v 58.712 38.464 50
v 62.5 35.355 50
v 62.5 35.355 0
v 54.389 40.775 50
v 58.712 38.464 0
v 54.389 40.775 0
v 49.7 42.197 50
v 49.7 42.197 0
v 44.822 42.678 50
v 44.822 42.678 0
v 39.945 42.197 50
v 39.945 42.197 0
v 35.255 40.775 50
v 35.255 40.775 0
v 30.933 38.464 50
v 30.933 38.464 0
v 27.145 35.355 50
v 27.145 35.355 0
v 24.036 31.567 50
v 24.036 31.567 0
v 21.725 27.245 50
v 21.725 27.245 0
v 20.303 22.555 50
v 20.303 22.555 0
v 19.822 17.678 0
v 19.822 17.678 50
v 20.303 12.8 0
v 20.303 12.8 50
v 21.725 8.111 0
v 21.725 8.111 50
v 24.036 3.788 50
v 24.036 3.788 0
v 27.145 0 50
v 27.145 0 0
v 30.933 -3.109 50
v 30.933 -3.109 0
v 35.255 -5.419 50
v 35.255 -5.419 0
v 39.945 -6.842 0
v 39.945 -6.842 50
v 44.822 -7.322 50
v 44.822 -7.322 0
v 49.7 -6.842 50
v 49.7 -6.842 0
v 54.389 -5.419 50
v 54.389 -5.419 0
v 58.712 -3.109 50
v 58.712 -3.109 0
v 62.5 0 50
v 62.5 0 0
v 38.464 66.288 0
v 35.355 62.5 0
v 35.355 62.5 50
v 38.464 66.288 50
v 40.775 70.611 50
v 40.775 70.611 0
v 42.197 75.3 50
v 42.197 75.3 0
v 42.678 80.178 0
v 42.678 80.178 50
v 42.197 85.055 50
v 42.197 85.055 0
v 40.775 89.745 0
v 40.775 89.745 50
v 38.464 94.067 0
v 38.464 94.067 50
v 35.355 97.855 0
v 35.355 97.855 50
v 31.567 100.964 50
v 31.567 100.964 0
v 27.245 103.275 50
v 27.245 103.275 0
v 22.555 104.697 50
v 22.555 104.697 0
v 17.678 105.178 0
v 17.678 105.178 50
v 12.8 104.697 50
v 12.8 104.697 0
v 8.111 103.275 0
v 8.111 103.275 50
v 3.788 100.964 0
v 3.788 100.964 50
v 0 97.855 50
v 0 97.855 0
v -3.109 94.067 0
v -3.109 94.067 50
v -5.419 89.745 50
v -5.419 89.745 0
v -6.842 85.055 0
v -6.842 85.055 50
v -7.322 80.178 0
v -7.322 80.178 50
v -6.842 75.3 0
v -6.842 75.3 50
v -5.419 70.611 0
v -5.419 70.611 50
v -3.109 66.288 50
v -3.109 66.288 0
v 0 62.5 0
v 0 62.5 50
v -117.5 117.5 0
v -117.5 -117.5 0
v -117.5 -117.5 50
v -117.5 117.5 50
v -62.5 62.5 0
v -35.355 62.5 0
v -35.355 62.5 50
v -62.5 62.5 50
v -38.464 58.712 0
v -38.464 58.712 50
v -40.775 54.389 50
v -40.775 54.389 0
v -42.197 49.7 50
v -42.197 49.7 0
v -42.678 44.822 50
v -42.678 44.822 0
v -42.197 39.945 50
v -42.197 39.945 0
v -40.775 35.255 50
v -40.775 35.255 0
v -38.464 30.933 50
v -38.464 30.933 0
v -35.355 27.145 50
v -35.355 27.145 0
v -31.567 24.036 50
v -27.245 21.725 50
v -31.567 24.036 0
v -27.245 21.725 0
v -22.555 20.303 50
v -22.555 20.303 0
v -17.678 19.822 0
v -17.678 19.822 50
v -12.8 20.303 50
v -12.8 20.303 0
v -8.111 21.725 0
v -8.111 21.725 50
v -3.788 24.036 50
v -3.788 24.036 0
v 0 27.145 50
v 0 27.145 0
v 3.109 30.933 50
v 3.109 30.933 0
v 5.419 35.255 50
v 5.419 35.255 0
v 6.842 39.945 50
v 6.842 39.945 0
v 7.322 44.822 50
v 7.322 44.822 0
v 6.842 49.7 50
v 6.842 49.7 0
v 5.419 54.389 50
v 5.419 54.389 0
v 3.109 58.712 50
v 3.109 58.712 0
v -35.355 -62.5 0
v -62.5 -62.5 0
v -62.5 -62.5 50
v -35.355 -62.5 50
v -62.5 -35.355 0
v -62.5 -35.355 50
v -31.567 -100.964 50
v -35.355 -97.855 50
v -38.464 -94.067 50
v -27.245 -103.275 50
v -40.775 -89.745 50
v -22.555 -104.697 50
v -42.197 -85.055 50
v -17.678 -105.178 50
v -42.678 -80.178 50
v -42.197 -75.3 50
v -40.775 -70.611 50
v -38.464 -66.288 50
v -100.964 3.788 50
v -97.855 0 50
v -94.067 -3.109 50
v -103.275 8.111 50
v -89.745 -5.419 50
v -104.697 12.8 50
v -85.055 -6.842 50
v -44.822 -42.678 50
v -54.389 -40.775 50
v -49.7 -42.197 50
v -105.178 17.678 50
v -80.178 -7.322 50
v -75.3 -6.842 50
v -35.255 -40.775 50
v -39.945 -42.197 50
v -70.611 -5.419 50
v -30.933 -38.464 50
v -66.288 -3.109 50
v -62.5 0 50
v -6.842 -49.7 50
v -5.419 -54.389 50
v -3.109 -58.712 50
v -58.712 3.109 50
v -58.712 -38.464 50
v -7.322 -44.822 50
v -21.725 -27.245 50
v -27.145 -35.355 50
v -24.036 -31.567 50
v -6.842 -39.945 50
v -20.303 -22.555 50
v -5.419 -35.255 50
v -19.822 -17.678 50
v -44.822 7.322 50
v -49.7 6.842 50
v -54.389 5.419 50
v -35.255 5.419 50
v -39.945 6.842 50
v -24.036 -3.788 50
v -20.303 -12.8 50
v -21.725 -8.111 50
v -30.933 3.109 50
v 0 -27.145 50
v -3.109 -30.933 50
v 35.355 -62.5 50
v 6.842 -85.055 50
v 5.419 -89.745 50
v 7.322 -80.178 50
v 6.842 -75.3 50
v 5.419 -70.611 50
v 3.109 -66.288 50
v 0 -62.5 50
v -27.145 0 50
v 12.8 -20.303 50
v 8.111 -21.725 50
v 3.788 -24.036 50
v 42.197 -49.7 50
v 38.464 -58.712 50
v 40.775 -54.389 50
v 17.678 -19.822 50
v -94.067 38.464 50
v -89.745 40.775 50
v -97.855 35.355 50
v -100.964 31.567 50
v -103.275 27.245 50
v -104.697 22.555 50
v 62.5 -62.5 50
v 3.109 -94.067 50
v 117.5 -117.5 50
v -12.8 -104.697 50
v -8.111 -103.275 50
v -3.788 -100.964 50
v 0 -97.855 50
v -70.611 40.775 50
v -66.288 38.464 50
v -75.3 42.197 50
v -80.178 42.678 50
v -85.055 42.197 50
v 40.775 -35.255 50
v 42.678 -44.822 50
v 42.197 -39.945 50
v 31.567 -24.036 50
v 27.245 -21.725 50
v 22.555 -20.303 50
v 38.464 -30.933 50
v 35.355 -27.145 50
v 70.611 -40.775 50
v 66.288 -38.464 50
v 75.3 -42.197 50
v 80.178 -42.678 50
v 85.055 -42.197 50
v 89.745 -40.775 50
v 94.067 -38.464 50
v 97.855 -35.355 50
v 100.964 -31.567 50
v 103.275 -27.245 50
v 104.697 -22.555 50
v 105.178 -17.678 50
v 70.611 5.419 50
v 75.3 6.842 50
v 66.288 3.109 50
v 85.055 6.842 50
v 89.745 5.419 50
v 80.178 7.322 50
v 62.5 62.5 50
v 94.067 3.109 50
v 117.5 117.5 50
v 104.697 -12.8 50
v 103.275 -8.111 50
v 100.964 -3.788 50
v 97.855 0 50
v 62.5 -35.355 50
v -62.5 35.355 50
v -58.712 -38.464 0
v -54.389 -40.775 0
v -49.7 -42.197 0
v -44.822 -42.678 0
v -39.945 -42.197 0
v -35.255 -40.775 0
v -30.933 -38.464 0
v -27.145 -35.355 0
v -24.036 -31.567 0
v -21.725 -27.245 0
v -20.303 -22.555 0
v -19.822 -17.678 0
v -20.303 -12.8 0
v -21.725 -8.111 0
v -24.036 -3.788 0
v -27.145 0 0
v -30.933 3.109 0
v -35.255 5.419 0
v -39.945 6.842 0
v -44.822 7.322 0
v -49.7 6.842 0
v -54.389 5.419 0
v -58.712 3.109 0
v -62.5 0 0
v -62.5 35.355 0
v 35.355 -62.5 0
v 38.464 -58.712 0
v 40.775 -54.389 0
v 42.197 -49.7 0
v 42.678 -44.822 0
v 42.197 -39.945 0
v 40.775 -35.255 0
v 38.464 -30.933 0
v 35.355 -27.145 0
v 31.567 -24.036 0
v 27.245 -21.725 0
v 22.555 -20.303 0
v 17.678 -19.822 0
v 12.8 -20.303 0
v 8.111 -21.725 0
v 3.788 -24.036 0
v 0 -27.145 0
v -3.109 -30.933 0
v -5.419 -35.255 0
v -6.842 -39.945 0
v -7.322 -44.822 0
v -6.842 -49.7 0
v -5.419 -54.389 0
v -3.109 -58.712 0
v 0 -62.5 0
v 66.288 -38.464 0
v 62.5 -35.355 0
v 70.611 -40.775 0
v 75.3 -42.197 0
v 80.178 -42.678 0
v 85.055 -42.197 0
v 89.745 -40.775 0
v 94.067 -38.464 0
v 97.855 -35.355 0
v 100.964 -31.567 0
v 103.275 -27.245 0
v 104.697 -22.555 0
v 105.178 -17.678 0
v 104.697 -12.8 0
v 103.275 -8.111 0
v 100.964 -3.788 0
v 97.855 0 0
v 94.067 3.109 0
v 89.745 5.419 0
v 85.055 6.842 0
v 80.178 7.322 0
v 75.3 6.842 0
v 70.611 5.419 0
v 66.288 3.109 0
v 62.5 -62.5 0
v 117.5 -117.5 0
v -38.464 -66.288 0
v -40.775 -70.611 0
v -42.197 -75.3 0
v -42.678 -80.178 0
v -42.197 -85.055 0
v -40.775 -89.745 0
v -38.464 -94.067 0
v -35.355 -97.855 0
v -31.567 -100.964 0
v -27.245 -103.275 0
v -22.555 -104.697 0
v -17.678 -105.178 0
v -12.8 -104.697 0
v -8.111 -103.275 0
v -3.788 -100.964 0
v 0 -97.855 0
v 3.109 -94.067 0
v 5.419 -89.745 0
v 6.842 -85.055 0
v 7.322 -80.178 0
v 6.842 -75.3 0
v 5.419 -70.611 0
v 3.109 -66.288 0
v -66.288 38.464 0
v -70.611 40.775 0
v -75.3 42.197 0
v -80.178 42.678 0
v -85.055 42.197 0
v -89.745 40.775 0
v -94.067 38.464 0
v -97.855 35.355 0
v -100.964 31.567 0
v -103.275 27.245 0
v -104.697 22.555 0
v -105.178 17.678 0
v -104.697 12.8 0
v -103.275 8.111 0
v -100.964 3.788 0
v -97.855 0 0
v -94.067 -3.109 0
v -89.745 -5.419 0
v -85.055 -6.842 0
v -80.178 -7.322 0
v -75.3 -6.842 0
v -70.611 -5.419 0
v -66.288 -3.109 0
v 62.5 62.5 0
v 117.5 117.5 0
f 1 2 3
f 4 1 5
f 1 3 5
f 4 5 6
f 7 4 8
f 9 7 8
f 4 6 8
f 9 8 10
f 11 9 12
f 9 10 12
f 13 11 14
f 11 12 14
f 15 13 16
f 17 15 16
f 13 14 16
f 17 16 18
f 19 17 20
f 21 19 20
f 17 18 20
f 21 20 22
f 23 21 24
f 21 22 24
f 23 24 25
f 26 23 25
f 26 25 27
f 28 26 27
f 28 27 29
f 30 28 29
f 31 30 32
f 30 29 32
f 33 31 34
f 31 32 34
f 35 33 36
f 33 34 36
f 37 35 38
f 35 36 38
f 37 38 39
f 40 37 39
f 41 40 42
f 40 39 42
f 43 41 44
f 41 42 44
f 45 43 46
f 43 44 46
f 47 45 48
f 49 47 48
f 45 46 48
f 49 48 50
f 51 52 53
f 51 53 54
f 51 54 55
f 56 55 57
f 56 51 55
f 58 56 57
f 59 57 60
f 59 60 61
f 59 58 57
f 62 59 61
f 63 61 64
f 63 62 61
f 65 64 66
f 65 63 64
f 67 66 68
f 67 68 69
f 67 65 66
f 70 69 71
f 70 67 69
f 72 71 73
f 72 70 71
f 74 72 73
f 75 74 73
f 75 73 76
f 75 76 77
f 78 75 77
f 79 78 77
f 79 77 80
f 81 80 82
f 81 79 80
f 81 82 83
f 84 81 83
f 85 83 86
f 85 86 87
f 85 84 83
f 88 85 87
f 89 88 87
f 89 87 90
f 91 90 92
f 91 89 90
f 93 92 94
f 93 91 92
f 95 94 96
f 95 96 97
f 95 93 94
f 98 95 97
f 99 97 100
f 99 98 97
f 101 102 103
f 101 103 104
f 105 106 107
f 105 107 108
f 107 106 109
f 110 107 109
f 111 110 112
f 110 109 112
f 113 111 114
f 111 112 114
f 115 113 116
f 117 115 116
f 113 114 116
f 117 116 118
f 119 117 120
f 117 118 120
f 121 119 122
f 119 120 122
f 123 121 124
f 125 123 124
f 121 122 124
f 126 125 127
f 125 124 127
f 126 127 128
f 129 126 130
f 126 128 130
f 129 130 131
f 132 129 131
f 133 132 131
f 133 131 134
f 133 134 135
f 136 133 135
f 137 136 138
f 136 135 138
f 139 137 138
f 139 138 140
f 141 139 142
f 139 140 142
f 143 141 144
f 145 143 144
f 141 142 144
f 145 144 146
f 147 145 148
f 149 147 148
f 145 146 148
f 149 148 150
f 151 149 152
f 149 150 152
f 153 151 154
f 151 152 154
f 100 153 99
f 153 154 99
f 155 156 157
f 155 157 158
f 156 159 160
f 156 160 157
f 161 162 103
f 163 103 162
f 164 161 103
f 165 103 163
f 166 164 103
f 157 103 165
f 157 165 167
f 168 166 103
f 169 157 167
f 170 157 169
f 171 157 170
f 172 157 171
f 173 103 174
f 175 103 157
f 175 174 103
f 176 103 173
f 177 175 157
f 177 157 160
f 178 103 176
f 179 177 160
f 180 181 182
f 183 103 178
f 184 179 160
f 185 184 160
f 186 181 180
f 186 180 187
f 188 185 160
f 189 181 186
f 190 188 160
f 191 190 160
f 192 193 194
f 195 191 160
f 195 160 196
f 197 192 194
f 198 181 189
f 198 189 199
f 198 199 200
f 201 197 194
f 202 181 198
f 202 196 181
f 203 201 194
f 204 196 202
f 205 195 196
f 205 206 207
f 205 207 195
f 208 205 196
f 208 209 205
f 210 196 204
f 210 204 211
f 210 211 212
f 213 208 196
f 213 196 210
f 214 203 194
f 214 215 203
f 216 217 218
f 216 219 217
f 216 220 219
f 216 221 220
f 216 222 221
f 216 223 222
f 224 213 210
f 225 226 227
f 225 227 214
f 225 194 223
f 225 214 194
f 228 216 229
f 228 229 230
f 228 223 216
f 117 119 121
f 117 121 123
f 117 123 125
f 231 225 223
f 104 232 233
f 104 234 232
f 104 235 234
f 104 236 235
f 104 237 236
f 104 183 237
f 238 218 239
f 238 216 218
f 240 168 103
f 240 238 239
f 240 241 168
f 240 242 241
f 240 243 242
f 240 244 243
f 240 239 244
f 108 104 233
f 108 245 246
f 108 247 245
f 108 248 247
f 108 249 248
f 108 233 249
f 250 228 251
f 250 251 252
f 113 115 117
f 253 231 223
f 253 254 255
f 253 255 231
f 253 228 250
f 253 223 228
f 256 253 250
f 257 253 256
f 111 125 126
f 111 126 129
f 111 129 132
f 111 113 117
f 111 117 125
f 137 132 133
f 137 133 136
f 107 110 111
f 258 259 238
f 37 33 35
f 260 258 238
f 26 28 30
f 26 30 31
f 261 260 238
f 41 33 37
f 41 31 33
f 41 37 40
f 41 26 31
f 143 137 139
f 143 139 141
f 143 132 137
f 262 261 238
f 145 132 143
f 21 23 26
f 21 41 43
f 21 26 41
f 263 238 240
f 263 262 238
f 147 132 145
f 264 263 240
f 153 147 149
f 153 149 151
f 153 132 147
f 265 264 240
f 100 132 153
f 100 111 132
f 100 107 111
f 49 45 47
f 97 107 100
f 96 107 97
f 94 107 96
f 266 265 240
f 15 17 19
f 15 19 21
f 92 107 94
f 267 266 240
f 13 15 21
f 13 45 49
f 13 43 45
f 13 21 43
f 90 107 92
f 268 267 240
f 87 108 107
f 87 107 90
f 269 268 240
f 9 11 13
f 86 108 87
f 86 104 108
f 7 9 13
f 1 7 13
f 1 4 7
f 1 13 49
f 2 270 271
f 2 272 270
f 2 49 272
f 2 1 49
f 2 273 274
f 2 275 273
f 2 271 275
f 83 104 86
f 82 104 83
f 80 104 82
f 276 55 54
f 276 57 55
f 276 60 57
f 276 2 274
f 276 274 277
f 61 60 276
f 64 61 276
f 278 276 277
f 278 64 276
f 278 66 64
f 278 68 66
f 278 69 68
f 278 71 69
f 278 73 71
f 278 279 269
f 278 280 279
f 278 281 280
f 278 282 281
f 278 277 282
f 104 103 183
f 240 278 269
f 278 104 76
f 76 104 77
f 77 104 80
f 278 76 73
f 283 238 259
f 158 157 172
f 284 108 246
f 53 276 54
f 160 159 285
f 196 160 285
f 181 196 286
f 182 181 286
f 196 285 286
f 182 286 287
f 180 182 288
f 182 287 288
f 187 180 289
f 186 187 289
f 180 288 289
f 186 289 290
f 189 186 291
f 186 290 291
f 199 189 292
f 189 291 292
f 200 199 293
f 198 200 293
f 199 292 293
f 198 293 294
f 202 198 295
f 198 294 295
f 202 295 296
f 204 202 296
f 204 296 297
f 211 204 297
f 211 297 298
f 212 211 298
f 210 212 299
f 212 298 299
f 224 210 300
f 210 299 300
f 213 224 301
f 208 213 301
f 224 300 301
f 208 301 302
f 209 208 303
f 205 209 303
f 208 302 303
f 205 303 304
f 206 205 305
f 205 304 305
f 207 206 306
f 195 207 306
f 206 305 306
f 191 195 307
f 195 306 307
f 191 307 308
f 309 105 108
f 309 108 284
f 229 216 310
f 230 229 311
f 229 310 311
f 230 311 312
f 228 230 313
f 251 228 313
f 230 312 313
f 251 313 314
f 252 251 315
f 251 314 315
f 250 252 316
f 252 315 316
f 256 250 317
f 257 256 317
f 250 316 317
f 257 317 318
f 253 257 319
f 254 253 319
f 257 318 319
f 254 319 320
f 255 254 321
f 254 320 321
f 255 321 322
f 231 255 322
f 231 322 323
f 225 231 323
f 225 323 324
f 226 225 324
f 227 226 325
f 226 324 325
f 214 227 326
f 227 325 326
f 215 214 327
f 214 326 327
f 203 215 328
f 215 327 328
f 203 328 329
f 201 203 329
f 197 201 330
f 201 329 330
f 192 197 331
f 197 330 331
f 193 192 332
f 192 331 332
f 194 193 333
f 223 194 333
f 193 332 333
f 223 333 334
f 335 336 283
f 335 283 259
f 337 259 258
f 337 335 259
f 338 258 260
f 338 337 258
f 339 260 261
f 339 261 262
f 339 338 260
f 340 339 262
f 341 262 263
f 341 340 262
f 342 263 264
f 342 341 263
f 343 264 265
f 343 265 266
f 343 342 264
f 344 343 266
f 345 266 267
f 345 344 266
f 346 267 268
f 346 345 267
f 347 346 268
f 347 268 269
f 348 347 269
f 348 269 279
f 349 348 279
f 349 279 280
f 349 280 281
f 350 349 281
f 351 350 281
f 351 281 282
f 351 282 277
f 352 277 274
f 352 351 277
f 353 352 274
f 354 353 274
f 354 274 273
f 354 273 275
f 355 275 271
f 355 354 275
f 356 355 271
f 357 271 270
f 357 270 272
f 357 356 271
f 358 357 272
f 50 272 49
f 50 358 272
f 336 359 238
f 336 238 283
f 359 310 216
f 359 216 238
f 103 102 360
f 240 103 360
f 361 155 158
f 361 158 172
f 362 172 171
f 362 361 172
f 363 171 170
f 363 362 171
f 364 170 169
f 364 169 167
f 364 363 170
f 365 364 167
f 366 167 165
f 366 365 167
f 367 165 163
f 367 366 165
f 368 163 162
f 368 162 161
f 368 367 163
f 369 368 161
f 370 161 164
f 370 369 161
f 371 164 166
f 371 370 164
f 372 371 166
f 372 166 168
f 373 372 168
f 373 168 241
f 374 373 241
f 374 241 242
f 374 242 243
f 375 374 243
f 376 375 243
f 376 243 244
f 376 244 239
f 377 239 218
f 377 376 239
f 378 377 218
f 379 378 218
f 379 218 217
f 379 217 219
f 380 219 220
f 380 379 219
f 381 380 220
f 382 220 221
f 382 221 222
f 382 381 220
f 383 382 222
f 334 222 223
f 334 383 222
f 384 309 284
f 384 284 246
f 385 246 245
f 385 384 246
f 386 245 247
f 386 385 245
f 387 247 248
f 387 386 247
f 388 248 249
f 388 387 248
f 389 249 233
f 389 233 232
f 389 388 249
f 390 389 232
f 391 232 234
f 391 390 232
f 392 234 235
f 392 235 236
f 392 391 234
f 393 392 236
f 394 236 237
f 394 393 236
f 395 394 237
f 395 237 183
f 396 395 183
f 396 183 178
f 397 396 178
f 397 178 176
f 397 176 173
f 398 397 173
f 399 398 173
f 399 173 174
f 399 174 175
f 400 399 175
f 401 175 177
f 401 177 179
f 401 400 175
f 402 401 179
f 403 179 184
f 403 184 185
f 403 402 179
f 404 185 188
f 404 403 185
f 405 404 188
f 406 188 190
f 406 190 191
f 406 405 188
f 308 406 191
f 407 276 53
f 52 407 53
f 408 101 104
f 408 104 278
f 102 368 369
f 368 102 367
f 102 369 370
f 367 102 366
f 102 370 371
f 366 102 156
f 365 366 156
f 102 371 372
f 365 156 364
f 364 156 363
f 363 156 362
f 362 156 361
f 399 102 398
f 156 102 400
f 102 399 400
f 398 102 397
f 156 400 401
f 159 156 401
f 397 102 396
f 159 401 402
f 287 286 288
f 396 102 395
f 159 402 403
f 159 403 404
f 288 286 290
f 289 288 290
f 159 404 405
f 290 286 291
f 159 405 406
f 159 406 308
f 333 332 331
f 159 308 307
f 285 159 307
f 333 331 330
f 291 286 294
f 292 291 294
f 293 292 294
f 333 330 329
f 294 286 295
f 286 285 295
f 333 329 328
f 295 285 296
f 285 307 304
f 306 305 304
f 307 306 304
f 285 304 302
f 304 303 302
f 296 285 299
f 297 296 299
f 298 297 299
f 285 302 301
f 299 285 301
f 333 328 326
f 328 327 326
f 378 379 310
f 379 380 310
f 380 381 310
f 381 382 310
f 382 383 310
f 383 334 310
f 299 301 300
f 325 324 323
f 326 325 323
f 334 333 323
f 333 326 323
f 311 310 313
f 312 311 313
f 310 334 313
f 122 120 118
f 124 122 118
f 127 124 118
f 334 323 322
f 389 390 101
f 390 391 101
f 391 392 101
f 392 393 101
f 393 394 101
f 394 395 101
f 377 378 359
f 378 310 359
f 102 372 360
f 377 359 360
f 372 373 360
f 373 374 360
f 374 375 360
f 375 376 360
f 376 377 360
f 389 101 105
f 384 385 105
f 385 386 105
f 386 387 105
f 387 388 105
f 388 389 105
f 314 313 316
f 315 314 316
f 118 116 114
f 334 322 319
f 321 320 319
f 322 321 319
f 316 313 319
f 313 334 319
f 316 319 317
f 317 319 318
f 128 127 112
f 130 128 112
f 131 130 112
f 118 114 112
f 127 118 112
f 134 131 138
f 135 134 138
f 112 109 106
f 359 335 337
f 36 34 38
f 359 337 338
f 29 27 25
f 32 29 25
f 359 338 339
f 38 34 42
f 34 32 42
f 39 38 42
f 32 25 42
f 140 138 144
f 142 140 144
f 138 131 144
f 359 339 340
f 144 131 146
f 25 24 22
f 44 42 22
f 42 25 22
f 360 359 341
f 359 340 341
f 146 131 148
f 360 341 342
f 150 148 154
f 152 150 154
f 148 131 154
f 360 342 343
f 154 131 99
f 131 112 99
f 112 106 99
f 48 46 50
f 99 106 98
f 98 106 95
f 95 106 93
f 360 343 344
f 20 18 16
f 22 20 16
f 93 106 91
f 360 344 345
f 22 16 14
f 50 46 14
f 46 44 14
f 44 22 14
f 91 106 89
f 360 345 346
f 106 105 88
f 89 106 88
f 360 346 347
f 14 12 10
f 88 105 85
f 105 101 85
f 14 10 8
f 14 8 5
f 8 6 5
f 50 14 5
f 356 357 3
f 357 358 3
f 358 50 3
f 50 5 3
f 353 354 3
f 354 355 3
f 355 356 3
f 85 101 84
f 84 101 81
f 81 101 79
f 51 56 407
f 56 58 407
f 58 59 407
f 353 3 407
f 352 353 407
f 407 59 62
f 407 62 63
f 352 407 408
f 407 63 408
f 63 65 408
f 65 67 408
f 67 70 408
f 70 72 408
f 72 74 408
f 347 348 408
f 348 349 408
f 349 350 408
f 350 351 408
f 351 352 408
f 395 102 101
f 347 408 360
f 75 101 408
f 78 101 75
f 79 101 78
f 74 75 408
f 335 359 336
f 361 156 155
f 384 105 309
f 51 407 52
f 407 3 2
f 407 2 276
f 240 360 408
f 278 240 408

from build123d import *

# Parameters (mm, degrees)
SKETCH_W  = 235
SKETCH_H  = 235
PAD_DEPTH = 50


with BuildPart() as part:
    # Sketch → Pad (new body)
    with BuildSketch(Plane.XY):
        Rectangle(SKETCH_W, SKETCH_H)
        with BuildLine():
            Line((62.5, -62.5), (62.5, -35.355339))
            ThreePointArc((62.5, -35.355339), (105.17767, -17.677671), (62.500003, 3e-06))
            ThreePointArc((62.5, 35.355339), (19.82233, 17.677668), (62.500003, 3e-06))
            Line((62.5, 35.355339), (62.5, 62.5))
            Line((62.5, 62.5), (35.355339, 62.5))
            ThreePointArc((35.355339, 62.5), (17.67769, 105.17767), (-2.9e-05, 62.500029))
            ThreePointArc((-35.355339, 62.5), (-17.677649, 19.82233), (-2.9e-05, 62.500029))
            Line((-35.355339, 62.5), (-62.5, 62.5))
            Line((-62.5, 62.5), (-62.5, 35.35541))
            ThreePointArc((-62.5, 35.35541), (-105.177634, 17.67768), (-62.499965, 3.5e-05))
            ThreePointArc((-62.5, -35.355269), (-19.822295, -17.677659), (-62.499965, 3.5e-05))
            Line((-62.5, -35.355269), (-62.5, -62.5))
            Line((-62.5, -62.5), (-35.355339, -62.5))
            ThreePointArc((-35.355339, -62.5), (-17.677671, -105.17767), (3e-06, -62.500003))
            ThreePointArc((35.355339, -62.5), (17.677668, -19.82233), (3e-06, -62.500003))
            Line((35.355339, -62.5), (62.5, -62.5))
        make_face(mode=Mode.SUBTRACT)
    extrude(amount=PAD_DEPTH)


solid = part.part
